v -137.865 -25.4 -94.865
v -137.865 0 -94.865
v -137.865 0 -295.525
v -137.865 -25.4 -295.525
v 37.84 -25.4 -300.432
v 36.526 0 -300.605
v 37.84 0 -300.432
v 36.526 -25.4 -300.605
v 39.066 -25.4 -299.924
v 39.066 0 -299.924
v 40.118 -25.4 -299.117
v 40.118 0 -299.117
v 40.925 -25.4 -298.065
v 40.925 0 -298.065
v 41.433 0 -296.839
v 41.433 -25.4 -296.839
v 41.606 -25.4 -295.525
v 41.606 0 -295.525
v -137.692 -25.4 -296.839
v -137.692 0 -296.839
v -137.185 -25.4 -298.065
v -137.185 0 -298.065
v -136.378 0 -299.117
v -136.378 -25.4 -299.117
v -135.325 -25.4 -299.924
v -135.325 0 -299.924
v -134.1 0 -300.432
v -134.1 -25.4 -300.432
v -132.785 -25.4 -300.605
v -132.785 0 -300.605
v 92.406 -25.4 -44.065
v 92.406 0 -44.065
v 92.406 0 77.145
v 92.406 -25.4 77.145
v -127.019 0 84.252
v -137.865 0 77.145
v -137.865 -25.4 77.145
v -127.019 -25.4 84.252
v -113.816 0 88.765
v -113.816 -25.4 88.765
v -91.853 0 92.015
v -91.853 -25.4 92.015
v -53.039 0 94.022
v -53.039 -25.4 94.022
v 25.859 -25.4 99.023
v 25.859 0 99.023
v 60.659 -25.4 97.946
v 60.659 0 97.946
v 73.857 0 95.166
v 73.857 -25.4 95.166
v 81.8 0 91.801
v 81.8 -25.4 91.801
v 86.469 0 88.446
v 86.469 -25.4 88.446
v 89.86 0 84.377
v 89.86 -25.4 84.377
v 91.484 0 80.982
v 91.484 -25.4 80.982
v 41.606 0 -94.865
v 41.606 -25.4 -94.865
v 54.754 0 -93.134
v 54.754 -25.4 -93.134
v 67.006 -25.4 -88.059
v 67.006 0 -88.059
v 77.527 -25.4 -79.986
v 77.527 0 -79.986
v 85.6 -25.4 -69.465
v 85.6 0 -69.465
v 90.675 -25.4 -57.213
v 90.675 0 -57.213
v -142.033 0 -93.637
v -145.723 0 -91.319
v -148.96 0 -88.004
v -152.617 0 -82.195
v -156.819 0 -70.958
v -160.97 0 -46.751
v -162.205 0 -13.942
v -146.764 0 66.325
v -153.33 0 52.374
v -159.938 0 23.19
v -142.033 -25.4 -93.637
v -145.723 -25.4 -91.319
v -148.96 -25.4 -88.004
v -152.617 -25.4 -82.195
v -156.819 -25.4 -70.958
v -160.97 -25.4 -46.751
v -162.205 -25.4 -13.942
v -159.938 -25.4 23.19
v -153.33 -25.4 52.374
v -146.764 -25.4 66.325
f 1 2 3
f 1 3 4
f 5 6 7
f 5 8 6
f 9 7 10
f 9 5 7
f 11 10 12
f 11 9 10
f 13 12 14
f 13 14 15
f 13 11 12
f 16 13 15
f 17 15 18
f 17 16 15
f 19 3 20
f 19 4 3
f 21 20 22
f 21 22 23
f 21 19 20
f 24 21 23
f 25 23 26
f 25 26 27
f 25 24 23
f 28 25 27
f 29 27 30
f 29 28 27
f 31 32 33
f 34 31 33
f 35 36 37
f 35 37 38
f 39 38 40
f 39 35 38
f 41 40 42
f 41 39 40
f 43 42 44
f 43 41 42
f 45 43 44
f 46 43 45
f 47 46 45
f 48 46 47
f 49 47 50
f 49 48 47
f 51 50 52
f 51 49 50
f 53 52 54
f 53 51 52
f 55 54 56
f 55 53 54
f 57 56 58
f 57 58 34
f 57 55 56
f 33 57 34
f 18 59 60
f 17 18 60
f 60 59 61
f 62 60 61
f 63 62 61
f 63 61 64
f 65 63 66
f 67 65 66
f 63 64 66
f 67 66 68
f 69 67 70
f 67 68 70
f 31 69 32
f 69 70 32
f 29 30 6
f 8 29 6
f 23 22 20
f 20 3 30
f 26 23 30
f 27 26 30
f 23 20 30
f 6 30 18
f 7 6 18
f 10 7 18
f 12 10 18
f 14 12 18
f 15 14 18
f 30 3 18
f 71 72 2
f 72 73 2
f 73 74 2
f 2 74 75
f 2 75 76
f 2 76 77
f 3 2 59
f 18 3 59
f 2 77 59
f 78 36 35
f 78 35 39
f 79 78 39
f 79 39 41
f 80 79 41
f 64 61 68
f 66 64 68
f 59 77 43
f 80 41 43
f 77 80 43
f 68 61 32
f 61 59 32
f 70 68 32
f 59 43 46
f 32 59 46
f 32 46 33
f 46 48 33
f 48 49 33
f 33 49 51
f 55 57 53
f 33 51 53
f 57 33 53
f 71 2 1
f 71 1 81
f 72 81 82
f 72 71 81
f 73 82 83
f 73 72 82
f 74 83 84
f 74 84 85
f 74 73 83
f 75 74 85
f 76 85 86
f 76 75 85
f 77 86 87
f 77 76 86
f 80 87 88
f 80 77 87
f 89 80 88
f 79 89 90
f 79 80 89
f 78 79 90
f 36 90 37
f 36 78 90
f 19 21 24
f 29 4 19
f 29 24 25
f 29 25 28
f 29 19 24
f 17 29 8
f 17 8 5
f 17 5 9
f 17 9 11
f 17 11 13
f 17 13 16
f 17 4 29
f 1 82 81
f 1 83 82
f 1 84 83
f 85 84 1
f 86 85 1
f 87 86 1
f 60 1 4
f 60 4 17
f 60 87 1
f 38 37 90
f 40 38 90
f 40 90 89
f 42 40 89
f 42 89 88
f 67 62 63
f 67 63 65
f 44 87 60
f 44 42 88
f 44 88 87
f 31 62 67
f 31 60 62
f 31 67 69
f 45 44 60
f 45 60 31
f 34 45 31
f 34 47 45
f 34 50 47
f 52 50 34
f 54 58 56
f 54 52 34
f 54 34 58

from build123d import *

# Parameters (mm, degrees)
F1_DEPTH = 25.4
F2_DEPTH = 205.74
F3_R     = 5.08


with BuildPart() as f1:
    # F0 (on Front) → F1 (new body)
    with BuildSketch(Plane.XZ):
        with BuildLine():
            Line((-137.8654783239, -94.8646968782), (-137.8654783239, 77.1448463202))
            add(Edge.make_bspline(
                [(-137.8654783239, -94.8646968782), (-158.2706578332, -91.8585594164), (-166.981581766, -7.7451420633), (-156.4983493038, 60.4911413287), (-137.8654783239, 77.1448463202)],
                knots=[0.5687155023, 0.5687155023, 0.5687155023, 0.5687155023, 0.6668544702, 0.7702510453, 0.7702510453, 0.7702510453, 0.7702510453], degree=3))
        make_face()
        with BuildLine():
            add(Edge.make_bspline(
                [(-137.8654783239, 77.1448463202), (-118.4092236957, 94.5344759251), (-46.2534441965, 88.953036709), (88.0846333213, 108.6653008956), (92.4056395888, 77.1448463202)],
                knots=[0.7702510453, 0.7702510453, 0.7702510453, 0.7702510453, 0.8782166988, 1, 1, 1, 1], degree=3))
            Line((-137.8654783239, 77.1448463202), (92.4056395888, 77.1448463202))
        make_face()
        with BuildLine():
            Line((92.4056395888, 77.1448463202), (-137.8654783239, 77.1448463202))
            Line((-137.8654783239, 77.1448463202), (-137.8654783239, -94.8646968782))
            Line((-137.8654783239, -94.8646968782), (-132.5711192259, -94.8646968782))
            add(Edge.make_bspline(
                [(92.4056395888, 70.2900443589), (88.177524096, 33.099393391), (0.8242697931, -63.9641826889), (-13.3528421954, -30.7865615999), (4.0839060304, -11.2757699491), (44.4742754931, 31.0623950536), (-38.227277915, 53.3707628282), (-31.9830279818, -8.9984561018), (-106.4943951176, -91.5314031198), (-132.5711192259, -94.8646968782)],
                knots=[0.0081423274, 0.0081423274, 0.0081423274, 0.0081423274, 0.1316241862, 0.1715089751, 0.2275439291, 0.2959483496, 0.3705997718, 0.4486594468, 0.560717639, 0.560717639, 0.560717639, 0.560717639], degree=3))
            Line((92.4056395888, 70.2900443589), (92.4056395888, 77.1448463202))
        make_face()
        with BuildLine():
            Line((92.4056395888, -44.0646968782), (92.4056395888, 70.2900443589))
            add(Edge.make_bspline(
                [(92.4056395888, 70.2900443589), (88.177524096, 33.099393391), (0.8242697931, -63.9641826889), (-13.3528421954, -30.7865615999), (4.0839060304, -11.2757699491), (44.4742754931, 31.0623950536), (-38.227277915, 53.3707628282), (-31.9830279818, -8.9984561018), (-106.4943951176, -91.5314031198), (-132.5711192259, -94.8646968782)],
                knots=[0.0081423274, 0.0081423274, 0.0081423274, 0.0081423274, 0.1316241862, 0.1715089751, 0.2275439291, 0.2959483496, 0.3705997718, 0.4486594468, 0.560717639, 0.560717639, 0.560717639, 0.560717639], degree=3))
            Line((-132.5711192259, -94.8646968782), (41.6056395888, -94.8646968782))
            ThreePointArc((41.6056395888, -94.8646968782), (77.5266640731, -79.9857213625), (92.4056395888, -44.0646968782))
        make_face()
    extrude(amount=F1_DEPTH)

    # F2 (add): a face of the model
    f2_faces = [f1.faces().sort_by_distance(p)[0] for p in [
        (-48.1299193675, -12.7, -94.8646968782),
    ]]
    extrude(f2_faces, amount=F2_DEPTH)

    # F3
    f3_edges = [f1.edges().sort_by_distance(p)[0] for p in [
        (41.60564, -12.7, -300.604697),
        (-137.865478, -12.7, -300.604697),
    ]]
    fillet(f3_edges, radius=F3_R)


solid = f1.part
